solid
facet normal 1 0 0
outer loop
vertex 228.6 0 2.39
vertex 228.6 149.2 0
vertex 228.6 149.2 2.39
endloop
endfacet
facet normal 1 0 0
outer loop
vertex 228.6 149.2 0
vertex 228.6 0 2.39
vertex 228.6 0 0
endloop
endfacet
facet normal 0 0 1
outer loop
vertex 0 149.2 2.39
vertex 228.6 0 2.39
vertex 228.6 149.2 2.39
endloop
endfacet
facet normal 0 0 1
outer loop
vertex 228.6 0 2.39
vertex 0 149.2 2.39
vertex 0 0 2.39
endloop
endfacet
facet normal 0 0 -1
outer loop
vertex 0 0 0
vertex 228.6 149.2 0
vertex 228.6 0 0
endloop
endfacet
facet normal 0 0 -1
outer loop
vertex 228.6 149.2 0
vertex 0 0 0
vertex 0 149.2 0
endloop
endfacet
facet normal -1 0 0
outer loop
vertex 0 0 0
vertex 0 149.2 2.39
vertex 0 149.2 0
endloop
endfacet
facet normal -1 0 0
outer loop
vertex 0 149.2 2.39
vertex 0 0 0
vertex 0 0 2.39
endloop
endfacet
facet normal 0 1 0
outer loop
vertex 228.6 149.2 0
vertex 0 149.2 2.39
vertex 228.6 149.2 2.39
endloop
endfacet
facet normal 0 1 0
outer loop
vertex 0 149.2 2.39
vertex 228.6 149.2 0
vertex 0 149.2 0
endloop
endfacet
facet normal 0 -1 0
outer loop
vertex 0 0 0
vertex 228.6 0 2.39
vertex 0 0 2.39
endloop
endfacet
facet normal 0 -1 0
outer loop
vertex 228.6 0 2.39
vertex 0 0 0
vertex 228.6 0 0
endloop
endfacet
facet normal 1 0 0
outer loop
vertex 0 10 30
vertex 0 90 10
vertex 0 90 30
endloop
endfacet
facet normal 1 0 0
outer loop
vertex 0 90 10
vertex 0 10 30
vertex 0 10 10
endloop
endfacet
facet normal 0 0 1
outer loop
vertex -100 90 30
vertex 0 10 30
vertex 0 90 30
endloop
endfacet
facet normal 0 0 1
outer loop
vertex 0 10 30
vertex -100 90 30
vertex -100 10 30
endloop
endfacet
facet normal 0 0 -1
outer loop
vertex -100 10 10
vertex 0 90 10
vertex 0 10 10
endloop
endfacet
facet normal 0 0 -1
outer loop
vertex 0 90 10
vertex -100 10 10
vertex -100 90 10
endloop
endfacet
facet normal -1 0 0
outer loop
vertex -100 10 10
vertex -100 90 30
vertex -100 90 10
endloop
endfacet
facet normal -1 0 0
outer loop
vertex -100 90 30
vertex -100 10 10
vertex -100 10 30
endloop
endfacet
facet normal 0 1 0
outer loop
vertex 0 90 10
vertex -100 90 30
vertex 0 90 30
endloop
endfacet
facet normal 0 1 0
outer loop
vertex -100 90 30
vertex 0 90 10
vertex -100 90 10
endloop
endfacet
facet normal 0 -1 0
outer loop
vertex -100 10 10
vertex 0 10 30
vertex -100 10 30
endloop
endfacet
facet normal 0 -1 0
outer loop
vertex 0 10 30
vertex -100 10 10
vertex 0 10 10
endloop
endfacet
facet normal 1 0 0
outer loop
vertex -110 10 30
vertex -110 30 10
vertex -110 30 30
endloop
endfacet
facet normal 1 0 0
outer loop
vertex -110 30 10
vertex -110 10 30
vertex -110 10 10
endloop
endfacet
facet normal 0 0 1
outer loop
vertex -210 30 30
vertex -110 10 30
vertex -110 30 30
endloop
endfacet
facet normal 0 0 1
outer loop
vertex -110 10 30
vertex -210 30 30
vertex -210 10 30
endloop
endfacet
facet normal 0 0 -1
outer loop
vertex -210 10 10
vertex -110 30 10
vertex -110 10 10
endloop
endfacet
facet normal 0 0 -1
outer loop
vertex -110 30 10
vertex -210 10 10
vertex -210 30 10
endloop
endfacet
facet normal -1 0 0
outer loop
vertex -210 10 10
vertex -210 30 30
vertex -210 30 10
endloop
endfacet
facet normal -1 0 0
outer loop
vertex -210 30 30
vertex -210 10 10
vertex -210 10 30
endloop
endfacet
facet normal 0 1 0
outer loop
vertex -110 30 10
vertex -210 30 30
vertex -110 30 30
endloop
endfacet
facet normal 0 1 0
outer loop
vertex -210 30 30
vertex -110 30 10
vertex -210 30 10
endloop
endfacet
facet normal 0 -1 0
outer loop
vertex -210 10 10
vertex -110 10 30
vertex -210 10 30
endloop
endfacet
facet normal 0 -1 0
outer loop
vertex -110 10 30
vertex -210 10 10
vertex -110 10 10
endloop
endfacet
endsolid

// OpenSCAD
/**
 * tontec-10.1-LCD-panel.scad is part of Paper Laptop.
 * It describes a the general dimensions of the LCD panel,
 * video card and control strip PCBs.
 *
 * General Specifications
 *
 * -Screen size:10.1 inches Display, ration:16:9/4:3 adjustable
 * -Resolution:1280×800 Pixels
 * -Outside dimension:228.6×149.2×2.39typ
 * -Display Area:216.96(H)×135.60(V) mm
 * -Display Component:Color TFT-LCD
 * -Brightness:350cd/m2
 * -Contrast Ratio:600:1
 * -Display Color :16.7M(6bits + Hi-FRC)
 * -Number of connection: 40 PIN LVDS
 * -Backlight: LED
 * -Consumption:6W-7W
 *
 * The five buttons are as follows: S1 = Power, S2=Menu/Select, S3=Up, S4=Down, S5=Video Source Select
 *
 * @author R. S. Doiel, <rsdoiel@gmail.com>
 * copyright (c) 2016 all rights reserved
 * Released under a BSD 2-clause license
 */
module tontec101panel() {
    color([0.5,1,0.5]) cube([228.6, 149.2,2.39]);
}

module tontec101videocard() {
  //FIXME: best guess, need to pickup a mm ruler.
  color([0.5,1,0.5]) cube([100,80,20]);
}

module tontec101controlcard() {
  //FIXME: best guess, need to pickup a mm ruler.
  color([0.5,1,0.5]) cube([100,20,20]);
}


tontec101panel();
translate([-100, 10, 10]) {
  tontec101videocard();
}
translate([-210, 10, 10]) {
    tontec101controlcard();
}
